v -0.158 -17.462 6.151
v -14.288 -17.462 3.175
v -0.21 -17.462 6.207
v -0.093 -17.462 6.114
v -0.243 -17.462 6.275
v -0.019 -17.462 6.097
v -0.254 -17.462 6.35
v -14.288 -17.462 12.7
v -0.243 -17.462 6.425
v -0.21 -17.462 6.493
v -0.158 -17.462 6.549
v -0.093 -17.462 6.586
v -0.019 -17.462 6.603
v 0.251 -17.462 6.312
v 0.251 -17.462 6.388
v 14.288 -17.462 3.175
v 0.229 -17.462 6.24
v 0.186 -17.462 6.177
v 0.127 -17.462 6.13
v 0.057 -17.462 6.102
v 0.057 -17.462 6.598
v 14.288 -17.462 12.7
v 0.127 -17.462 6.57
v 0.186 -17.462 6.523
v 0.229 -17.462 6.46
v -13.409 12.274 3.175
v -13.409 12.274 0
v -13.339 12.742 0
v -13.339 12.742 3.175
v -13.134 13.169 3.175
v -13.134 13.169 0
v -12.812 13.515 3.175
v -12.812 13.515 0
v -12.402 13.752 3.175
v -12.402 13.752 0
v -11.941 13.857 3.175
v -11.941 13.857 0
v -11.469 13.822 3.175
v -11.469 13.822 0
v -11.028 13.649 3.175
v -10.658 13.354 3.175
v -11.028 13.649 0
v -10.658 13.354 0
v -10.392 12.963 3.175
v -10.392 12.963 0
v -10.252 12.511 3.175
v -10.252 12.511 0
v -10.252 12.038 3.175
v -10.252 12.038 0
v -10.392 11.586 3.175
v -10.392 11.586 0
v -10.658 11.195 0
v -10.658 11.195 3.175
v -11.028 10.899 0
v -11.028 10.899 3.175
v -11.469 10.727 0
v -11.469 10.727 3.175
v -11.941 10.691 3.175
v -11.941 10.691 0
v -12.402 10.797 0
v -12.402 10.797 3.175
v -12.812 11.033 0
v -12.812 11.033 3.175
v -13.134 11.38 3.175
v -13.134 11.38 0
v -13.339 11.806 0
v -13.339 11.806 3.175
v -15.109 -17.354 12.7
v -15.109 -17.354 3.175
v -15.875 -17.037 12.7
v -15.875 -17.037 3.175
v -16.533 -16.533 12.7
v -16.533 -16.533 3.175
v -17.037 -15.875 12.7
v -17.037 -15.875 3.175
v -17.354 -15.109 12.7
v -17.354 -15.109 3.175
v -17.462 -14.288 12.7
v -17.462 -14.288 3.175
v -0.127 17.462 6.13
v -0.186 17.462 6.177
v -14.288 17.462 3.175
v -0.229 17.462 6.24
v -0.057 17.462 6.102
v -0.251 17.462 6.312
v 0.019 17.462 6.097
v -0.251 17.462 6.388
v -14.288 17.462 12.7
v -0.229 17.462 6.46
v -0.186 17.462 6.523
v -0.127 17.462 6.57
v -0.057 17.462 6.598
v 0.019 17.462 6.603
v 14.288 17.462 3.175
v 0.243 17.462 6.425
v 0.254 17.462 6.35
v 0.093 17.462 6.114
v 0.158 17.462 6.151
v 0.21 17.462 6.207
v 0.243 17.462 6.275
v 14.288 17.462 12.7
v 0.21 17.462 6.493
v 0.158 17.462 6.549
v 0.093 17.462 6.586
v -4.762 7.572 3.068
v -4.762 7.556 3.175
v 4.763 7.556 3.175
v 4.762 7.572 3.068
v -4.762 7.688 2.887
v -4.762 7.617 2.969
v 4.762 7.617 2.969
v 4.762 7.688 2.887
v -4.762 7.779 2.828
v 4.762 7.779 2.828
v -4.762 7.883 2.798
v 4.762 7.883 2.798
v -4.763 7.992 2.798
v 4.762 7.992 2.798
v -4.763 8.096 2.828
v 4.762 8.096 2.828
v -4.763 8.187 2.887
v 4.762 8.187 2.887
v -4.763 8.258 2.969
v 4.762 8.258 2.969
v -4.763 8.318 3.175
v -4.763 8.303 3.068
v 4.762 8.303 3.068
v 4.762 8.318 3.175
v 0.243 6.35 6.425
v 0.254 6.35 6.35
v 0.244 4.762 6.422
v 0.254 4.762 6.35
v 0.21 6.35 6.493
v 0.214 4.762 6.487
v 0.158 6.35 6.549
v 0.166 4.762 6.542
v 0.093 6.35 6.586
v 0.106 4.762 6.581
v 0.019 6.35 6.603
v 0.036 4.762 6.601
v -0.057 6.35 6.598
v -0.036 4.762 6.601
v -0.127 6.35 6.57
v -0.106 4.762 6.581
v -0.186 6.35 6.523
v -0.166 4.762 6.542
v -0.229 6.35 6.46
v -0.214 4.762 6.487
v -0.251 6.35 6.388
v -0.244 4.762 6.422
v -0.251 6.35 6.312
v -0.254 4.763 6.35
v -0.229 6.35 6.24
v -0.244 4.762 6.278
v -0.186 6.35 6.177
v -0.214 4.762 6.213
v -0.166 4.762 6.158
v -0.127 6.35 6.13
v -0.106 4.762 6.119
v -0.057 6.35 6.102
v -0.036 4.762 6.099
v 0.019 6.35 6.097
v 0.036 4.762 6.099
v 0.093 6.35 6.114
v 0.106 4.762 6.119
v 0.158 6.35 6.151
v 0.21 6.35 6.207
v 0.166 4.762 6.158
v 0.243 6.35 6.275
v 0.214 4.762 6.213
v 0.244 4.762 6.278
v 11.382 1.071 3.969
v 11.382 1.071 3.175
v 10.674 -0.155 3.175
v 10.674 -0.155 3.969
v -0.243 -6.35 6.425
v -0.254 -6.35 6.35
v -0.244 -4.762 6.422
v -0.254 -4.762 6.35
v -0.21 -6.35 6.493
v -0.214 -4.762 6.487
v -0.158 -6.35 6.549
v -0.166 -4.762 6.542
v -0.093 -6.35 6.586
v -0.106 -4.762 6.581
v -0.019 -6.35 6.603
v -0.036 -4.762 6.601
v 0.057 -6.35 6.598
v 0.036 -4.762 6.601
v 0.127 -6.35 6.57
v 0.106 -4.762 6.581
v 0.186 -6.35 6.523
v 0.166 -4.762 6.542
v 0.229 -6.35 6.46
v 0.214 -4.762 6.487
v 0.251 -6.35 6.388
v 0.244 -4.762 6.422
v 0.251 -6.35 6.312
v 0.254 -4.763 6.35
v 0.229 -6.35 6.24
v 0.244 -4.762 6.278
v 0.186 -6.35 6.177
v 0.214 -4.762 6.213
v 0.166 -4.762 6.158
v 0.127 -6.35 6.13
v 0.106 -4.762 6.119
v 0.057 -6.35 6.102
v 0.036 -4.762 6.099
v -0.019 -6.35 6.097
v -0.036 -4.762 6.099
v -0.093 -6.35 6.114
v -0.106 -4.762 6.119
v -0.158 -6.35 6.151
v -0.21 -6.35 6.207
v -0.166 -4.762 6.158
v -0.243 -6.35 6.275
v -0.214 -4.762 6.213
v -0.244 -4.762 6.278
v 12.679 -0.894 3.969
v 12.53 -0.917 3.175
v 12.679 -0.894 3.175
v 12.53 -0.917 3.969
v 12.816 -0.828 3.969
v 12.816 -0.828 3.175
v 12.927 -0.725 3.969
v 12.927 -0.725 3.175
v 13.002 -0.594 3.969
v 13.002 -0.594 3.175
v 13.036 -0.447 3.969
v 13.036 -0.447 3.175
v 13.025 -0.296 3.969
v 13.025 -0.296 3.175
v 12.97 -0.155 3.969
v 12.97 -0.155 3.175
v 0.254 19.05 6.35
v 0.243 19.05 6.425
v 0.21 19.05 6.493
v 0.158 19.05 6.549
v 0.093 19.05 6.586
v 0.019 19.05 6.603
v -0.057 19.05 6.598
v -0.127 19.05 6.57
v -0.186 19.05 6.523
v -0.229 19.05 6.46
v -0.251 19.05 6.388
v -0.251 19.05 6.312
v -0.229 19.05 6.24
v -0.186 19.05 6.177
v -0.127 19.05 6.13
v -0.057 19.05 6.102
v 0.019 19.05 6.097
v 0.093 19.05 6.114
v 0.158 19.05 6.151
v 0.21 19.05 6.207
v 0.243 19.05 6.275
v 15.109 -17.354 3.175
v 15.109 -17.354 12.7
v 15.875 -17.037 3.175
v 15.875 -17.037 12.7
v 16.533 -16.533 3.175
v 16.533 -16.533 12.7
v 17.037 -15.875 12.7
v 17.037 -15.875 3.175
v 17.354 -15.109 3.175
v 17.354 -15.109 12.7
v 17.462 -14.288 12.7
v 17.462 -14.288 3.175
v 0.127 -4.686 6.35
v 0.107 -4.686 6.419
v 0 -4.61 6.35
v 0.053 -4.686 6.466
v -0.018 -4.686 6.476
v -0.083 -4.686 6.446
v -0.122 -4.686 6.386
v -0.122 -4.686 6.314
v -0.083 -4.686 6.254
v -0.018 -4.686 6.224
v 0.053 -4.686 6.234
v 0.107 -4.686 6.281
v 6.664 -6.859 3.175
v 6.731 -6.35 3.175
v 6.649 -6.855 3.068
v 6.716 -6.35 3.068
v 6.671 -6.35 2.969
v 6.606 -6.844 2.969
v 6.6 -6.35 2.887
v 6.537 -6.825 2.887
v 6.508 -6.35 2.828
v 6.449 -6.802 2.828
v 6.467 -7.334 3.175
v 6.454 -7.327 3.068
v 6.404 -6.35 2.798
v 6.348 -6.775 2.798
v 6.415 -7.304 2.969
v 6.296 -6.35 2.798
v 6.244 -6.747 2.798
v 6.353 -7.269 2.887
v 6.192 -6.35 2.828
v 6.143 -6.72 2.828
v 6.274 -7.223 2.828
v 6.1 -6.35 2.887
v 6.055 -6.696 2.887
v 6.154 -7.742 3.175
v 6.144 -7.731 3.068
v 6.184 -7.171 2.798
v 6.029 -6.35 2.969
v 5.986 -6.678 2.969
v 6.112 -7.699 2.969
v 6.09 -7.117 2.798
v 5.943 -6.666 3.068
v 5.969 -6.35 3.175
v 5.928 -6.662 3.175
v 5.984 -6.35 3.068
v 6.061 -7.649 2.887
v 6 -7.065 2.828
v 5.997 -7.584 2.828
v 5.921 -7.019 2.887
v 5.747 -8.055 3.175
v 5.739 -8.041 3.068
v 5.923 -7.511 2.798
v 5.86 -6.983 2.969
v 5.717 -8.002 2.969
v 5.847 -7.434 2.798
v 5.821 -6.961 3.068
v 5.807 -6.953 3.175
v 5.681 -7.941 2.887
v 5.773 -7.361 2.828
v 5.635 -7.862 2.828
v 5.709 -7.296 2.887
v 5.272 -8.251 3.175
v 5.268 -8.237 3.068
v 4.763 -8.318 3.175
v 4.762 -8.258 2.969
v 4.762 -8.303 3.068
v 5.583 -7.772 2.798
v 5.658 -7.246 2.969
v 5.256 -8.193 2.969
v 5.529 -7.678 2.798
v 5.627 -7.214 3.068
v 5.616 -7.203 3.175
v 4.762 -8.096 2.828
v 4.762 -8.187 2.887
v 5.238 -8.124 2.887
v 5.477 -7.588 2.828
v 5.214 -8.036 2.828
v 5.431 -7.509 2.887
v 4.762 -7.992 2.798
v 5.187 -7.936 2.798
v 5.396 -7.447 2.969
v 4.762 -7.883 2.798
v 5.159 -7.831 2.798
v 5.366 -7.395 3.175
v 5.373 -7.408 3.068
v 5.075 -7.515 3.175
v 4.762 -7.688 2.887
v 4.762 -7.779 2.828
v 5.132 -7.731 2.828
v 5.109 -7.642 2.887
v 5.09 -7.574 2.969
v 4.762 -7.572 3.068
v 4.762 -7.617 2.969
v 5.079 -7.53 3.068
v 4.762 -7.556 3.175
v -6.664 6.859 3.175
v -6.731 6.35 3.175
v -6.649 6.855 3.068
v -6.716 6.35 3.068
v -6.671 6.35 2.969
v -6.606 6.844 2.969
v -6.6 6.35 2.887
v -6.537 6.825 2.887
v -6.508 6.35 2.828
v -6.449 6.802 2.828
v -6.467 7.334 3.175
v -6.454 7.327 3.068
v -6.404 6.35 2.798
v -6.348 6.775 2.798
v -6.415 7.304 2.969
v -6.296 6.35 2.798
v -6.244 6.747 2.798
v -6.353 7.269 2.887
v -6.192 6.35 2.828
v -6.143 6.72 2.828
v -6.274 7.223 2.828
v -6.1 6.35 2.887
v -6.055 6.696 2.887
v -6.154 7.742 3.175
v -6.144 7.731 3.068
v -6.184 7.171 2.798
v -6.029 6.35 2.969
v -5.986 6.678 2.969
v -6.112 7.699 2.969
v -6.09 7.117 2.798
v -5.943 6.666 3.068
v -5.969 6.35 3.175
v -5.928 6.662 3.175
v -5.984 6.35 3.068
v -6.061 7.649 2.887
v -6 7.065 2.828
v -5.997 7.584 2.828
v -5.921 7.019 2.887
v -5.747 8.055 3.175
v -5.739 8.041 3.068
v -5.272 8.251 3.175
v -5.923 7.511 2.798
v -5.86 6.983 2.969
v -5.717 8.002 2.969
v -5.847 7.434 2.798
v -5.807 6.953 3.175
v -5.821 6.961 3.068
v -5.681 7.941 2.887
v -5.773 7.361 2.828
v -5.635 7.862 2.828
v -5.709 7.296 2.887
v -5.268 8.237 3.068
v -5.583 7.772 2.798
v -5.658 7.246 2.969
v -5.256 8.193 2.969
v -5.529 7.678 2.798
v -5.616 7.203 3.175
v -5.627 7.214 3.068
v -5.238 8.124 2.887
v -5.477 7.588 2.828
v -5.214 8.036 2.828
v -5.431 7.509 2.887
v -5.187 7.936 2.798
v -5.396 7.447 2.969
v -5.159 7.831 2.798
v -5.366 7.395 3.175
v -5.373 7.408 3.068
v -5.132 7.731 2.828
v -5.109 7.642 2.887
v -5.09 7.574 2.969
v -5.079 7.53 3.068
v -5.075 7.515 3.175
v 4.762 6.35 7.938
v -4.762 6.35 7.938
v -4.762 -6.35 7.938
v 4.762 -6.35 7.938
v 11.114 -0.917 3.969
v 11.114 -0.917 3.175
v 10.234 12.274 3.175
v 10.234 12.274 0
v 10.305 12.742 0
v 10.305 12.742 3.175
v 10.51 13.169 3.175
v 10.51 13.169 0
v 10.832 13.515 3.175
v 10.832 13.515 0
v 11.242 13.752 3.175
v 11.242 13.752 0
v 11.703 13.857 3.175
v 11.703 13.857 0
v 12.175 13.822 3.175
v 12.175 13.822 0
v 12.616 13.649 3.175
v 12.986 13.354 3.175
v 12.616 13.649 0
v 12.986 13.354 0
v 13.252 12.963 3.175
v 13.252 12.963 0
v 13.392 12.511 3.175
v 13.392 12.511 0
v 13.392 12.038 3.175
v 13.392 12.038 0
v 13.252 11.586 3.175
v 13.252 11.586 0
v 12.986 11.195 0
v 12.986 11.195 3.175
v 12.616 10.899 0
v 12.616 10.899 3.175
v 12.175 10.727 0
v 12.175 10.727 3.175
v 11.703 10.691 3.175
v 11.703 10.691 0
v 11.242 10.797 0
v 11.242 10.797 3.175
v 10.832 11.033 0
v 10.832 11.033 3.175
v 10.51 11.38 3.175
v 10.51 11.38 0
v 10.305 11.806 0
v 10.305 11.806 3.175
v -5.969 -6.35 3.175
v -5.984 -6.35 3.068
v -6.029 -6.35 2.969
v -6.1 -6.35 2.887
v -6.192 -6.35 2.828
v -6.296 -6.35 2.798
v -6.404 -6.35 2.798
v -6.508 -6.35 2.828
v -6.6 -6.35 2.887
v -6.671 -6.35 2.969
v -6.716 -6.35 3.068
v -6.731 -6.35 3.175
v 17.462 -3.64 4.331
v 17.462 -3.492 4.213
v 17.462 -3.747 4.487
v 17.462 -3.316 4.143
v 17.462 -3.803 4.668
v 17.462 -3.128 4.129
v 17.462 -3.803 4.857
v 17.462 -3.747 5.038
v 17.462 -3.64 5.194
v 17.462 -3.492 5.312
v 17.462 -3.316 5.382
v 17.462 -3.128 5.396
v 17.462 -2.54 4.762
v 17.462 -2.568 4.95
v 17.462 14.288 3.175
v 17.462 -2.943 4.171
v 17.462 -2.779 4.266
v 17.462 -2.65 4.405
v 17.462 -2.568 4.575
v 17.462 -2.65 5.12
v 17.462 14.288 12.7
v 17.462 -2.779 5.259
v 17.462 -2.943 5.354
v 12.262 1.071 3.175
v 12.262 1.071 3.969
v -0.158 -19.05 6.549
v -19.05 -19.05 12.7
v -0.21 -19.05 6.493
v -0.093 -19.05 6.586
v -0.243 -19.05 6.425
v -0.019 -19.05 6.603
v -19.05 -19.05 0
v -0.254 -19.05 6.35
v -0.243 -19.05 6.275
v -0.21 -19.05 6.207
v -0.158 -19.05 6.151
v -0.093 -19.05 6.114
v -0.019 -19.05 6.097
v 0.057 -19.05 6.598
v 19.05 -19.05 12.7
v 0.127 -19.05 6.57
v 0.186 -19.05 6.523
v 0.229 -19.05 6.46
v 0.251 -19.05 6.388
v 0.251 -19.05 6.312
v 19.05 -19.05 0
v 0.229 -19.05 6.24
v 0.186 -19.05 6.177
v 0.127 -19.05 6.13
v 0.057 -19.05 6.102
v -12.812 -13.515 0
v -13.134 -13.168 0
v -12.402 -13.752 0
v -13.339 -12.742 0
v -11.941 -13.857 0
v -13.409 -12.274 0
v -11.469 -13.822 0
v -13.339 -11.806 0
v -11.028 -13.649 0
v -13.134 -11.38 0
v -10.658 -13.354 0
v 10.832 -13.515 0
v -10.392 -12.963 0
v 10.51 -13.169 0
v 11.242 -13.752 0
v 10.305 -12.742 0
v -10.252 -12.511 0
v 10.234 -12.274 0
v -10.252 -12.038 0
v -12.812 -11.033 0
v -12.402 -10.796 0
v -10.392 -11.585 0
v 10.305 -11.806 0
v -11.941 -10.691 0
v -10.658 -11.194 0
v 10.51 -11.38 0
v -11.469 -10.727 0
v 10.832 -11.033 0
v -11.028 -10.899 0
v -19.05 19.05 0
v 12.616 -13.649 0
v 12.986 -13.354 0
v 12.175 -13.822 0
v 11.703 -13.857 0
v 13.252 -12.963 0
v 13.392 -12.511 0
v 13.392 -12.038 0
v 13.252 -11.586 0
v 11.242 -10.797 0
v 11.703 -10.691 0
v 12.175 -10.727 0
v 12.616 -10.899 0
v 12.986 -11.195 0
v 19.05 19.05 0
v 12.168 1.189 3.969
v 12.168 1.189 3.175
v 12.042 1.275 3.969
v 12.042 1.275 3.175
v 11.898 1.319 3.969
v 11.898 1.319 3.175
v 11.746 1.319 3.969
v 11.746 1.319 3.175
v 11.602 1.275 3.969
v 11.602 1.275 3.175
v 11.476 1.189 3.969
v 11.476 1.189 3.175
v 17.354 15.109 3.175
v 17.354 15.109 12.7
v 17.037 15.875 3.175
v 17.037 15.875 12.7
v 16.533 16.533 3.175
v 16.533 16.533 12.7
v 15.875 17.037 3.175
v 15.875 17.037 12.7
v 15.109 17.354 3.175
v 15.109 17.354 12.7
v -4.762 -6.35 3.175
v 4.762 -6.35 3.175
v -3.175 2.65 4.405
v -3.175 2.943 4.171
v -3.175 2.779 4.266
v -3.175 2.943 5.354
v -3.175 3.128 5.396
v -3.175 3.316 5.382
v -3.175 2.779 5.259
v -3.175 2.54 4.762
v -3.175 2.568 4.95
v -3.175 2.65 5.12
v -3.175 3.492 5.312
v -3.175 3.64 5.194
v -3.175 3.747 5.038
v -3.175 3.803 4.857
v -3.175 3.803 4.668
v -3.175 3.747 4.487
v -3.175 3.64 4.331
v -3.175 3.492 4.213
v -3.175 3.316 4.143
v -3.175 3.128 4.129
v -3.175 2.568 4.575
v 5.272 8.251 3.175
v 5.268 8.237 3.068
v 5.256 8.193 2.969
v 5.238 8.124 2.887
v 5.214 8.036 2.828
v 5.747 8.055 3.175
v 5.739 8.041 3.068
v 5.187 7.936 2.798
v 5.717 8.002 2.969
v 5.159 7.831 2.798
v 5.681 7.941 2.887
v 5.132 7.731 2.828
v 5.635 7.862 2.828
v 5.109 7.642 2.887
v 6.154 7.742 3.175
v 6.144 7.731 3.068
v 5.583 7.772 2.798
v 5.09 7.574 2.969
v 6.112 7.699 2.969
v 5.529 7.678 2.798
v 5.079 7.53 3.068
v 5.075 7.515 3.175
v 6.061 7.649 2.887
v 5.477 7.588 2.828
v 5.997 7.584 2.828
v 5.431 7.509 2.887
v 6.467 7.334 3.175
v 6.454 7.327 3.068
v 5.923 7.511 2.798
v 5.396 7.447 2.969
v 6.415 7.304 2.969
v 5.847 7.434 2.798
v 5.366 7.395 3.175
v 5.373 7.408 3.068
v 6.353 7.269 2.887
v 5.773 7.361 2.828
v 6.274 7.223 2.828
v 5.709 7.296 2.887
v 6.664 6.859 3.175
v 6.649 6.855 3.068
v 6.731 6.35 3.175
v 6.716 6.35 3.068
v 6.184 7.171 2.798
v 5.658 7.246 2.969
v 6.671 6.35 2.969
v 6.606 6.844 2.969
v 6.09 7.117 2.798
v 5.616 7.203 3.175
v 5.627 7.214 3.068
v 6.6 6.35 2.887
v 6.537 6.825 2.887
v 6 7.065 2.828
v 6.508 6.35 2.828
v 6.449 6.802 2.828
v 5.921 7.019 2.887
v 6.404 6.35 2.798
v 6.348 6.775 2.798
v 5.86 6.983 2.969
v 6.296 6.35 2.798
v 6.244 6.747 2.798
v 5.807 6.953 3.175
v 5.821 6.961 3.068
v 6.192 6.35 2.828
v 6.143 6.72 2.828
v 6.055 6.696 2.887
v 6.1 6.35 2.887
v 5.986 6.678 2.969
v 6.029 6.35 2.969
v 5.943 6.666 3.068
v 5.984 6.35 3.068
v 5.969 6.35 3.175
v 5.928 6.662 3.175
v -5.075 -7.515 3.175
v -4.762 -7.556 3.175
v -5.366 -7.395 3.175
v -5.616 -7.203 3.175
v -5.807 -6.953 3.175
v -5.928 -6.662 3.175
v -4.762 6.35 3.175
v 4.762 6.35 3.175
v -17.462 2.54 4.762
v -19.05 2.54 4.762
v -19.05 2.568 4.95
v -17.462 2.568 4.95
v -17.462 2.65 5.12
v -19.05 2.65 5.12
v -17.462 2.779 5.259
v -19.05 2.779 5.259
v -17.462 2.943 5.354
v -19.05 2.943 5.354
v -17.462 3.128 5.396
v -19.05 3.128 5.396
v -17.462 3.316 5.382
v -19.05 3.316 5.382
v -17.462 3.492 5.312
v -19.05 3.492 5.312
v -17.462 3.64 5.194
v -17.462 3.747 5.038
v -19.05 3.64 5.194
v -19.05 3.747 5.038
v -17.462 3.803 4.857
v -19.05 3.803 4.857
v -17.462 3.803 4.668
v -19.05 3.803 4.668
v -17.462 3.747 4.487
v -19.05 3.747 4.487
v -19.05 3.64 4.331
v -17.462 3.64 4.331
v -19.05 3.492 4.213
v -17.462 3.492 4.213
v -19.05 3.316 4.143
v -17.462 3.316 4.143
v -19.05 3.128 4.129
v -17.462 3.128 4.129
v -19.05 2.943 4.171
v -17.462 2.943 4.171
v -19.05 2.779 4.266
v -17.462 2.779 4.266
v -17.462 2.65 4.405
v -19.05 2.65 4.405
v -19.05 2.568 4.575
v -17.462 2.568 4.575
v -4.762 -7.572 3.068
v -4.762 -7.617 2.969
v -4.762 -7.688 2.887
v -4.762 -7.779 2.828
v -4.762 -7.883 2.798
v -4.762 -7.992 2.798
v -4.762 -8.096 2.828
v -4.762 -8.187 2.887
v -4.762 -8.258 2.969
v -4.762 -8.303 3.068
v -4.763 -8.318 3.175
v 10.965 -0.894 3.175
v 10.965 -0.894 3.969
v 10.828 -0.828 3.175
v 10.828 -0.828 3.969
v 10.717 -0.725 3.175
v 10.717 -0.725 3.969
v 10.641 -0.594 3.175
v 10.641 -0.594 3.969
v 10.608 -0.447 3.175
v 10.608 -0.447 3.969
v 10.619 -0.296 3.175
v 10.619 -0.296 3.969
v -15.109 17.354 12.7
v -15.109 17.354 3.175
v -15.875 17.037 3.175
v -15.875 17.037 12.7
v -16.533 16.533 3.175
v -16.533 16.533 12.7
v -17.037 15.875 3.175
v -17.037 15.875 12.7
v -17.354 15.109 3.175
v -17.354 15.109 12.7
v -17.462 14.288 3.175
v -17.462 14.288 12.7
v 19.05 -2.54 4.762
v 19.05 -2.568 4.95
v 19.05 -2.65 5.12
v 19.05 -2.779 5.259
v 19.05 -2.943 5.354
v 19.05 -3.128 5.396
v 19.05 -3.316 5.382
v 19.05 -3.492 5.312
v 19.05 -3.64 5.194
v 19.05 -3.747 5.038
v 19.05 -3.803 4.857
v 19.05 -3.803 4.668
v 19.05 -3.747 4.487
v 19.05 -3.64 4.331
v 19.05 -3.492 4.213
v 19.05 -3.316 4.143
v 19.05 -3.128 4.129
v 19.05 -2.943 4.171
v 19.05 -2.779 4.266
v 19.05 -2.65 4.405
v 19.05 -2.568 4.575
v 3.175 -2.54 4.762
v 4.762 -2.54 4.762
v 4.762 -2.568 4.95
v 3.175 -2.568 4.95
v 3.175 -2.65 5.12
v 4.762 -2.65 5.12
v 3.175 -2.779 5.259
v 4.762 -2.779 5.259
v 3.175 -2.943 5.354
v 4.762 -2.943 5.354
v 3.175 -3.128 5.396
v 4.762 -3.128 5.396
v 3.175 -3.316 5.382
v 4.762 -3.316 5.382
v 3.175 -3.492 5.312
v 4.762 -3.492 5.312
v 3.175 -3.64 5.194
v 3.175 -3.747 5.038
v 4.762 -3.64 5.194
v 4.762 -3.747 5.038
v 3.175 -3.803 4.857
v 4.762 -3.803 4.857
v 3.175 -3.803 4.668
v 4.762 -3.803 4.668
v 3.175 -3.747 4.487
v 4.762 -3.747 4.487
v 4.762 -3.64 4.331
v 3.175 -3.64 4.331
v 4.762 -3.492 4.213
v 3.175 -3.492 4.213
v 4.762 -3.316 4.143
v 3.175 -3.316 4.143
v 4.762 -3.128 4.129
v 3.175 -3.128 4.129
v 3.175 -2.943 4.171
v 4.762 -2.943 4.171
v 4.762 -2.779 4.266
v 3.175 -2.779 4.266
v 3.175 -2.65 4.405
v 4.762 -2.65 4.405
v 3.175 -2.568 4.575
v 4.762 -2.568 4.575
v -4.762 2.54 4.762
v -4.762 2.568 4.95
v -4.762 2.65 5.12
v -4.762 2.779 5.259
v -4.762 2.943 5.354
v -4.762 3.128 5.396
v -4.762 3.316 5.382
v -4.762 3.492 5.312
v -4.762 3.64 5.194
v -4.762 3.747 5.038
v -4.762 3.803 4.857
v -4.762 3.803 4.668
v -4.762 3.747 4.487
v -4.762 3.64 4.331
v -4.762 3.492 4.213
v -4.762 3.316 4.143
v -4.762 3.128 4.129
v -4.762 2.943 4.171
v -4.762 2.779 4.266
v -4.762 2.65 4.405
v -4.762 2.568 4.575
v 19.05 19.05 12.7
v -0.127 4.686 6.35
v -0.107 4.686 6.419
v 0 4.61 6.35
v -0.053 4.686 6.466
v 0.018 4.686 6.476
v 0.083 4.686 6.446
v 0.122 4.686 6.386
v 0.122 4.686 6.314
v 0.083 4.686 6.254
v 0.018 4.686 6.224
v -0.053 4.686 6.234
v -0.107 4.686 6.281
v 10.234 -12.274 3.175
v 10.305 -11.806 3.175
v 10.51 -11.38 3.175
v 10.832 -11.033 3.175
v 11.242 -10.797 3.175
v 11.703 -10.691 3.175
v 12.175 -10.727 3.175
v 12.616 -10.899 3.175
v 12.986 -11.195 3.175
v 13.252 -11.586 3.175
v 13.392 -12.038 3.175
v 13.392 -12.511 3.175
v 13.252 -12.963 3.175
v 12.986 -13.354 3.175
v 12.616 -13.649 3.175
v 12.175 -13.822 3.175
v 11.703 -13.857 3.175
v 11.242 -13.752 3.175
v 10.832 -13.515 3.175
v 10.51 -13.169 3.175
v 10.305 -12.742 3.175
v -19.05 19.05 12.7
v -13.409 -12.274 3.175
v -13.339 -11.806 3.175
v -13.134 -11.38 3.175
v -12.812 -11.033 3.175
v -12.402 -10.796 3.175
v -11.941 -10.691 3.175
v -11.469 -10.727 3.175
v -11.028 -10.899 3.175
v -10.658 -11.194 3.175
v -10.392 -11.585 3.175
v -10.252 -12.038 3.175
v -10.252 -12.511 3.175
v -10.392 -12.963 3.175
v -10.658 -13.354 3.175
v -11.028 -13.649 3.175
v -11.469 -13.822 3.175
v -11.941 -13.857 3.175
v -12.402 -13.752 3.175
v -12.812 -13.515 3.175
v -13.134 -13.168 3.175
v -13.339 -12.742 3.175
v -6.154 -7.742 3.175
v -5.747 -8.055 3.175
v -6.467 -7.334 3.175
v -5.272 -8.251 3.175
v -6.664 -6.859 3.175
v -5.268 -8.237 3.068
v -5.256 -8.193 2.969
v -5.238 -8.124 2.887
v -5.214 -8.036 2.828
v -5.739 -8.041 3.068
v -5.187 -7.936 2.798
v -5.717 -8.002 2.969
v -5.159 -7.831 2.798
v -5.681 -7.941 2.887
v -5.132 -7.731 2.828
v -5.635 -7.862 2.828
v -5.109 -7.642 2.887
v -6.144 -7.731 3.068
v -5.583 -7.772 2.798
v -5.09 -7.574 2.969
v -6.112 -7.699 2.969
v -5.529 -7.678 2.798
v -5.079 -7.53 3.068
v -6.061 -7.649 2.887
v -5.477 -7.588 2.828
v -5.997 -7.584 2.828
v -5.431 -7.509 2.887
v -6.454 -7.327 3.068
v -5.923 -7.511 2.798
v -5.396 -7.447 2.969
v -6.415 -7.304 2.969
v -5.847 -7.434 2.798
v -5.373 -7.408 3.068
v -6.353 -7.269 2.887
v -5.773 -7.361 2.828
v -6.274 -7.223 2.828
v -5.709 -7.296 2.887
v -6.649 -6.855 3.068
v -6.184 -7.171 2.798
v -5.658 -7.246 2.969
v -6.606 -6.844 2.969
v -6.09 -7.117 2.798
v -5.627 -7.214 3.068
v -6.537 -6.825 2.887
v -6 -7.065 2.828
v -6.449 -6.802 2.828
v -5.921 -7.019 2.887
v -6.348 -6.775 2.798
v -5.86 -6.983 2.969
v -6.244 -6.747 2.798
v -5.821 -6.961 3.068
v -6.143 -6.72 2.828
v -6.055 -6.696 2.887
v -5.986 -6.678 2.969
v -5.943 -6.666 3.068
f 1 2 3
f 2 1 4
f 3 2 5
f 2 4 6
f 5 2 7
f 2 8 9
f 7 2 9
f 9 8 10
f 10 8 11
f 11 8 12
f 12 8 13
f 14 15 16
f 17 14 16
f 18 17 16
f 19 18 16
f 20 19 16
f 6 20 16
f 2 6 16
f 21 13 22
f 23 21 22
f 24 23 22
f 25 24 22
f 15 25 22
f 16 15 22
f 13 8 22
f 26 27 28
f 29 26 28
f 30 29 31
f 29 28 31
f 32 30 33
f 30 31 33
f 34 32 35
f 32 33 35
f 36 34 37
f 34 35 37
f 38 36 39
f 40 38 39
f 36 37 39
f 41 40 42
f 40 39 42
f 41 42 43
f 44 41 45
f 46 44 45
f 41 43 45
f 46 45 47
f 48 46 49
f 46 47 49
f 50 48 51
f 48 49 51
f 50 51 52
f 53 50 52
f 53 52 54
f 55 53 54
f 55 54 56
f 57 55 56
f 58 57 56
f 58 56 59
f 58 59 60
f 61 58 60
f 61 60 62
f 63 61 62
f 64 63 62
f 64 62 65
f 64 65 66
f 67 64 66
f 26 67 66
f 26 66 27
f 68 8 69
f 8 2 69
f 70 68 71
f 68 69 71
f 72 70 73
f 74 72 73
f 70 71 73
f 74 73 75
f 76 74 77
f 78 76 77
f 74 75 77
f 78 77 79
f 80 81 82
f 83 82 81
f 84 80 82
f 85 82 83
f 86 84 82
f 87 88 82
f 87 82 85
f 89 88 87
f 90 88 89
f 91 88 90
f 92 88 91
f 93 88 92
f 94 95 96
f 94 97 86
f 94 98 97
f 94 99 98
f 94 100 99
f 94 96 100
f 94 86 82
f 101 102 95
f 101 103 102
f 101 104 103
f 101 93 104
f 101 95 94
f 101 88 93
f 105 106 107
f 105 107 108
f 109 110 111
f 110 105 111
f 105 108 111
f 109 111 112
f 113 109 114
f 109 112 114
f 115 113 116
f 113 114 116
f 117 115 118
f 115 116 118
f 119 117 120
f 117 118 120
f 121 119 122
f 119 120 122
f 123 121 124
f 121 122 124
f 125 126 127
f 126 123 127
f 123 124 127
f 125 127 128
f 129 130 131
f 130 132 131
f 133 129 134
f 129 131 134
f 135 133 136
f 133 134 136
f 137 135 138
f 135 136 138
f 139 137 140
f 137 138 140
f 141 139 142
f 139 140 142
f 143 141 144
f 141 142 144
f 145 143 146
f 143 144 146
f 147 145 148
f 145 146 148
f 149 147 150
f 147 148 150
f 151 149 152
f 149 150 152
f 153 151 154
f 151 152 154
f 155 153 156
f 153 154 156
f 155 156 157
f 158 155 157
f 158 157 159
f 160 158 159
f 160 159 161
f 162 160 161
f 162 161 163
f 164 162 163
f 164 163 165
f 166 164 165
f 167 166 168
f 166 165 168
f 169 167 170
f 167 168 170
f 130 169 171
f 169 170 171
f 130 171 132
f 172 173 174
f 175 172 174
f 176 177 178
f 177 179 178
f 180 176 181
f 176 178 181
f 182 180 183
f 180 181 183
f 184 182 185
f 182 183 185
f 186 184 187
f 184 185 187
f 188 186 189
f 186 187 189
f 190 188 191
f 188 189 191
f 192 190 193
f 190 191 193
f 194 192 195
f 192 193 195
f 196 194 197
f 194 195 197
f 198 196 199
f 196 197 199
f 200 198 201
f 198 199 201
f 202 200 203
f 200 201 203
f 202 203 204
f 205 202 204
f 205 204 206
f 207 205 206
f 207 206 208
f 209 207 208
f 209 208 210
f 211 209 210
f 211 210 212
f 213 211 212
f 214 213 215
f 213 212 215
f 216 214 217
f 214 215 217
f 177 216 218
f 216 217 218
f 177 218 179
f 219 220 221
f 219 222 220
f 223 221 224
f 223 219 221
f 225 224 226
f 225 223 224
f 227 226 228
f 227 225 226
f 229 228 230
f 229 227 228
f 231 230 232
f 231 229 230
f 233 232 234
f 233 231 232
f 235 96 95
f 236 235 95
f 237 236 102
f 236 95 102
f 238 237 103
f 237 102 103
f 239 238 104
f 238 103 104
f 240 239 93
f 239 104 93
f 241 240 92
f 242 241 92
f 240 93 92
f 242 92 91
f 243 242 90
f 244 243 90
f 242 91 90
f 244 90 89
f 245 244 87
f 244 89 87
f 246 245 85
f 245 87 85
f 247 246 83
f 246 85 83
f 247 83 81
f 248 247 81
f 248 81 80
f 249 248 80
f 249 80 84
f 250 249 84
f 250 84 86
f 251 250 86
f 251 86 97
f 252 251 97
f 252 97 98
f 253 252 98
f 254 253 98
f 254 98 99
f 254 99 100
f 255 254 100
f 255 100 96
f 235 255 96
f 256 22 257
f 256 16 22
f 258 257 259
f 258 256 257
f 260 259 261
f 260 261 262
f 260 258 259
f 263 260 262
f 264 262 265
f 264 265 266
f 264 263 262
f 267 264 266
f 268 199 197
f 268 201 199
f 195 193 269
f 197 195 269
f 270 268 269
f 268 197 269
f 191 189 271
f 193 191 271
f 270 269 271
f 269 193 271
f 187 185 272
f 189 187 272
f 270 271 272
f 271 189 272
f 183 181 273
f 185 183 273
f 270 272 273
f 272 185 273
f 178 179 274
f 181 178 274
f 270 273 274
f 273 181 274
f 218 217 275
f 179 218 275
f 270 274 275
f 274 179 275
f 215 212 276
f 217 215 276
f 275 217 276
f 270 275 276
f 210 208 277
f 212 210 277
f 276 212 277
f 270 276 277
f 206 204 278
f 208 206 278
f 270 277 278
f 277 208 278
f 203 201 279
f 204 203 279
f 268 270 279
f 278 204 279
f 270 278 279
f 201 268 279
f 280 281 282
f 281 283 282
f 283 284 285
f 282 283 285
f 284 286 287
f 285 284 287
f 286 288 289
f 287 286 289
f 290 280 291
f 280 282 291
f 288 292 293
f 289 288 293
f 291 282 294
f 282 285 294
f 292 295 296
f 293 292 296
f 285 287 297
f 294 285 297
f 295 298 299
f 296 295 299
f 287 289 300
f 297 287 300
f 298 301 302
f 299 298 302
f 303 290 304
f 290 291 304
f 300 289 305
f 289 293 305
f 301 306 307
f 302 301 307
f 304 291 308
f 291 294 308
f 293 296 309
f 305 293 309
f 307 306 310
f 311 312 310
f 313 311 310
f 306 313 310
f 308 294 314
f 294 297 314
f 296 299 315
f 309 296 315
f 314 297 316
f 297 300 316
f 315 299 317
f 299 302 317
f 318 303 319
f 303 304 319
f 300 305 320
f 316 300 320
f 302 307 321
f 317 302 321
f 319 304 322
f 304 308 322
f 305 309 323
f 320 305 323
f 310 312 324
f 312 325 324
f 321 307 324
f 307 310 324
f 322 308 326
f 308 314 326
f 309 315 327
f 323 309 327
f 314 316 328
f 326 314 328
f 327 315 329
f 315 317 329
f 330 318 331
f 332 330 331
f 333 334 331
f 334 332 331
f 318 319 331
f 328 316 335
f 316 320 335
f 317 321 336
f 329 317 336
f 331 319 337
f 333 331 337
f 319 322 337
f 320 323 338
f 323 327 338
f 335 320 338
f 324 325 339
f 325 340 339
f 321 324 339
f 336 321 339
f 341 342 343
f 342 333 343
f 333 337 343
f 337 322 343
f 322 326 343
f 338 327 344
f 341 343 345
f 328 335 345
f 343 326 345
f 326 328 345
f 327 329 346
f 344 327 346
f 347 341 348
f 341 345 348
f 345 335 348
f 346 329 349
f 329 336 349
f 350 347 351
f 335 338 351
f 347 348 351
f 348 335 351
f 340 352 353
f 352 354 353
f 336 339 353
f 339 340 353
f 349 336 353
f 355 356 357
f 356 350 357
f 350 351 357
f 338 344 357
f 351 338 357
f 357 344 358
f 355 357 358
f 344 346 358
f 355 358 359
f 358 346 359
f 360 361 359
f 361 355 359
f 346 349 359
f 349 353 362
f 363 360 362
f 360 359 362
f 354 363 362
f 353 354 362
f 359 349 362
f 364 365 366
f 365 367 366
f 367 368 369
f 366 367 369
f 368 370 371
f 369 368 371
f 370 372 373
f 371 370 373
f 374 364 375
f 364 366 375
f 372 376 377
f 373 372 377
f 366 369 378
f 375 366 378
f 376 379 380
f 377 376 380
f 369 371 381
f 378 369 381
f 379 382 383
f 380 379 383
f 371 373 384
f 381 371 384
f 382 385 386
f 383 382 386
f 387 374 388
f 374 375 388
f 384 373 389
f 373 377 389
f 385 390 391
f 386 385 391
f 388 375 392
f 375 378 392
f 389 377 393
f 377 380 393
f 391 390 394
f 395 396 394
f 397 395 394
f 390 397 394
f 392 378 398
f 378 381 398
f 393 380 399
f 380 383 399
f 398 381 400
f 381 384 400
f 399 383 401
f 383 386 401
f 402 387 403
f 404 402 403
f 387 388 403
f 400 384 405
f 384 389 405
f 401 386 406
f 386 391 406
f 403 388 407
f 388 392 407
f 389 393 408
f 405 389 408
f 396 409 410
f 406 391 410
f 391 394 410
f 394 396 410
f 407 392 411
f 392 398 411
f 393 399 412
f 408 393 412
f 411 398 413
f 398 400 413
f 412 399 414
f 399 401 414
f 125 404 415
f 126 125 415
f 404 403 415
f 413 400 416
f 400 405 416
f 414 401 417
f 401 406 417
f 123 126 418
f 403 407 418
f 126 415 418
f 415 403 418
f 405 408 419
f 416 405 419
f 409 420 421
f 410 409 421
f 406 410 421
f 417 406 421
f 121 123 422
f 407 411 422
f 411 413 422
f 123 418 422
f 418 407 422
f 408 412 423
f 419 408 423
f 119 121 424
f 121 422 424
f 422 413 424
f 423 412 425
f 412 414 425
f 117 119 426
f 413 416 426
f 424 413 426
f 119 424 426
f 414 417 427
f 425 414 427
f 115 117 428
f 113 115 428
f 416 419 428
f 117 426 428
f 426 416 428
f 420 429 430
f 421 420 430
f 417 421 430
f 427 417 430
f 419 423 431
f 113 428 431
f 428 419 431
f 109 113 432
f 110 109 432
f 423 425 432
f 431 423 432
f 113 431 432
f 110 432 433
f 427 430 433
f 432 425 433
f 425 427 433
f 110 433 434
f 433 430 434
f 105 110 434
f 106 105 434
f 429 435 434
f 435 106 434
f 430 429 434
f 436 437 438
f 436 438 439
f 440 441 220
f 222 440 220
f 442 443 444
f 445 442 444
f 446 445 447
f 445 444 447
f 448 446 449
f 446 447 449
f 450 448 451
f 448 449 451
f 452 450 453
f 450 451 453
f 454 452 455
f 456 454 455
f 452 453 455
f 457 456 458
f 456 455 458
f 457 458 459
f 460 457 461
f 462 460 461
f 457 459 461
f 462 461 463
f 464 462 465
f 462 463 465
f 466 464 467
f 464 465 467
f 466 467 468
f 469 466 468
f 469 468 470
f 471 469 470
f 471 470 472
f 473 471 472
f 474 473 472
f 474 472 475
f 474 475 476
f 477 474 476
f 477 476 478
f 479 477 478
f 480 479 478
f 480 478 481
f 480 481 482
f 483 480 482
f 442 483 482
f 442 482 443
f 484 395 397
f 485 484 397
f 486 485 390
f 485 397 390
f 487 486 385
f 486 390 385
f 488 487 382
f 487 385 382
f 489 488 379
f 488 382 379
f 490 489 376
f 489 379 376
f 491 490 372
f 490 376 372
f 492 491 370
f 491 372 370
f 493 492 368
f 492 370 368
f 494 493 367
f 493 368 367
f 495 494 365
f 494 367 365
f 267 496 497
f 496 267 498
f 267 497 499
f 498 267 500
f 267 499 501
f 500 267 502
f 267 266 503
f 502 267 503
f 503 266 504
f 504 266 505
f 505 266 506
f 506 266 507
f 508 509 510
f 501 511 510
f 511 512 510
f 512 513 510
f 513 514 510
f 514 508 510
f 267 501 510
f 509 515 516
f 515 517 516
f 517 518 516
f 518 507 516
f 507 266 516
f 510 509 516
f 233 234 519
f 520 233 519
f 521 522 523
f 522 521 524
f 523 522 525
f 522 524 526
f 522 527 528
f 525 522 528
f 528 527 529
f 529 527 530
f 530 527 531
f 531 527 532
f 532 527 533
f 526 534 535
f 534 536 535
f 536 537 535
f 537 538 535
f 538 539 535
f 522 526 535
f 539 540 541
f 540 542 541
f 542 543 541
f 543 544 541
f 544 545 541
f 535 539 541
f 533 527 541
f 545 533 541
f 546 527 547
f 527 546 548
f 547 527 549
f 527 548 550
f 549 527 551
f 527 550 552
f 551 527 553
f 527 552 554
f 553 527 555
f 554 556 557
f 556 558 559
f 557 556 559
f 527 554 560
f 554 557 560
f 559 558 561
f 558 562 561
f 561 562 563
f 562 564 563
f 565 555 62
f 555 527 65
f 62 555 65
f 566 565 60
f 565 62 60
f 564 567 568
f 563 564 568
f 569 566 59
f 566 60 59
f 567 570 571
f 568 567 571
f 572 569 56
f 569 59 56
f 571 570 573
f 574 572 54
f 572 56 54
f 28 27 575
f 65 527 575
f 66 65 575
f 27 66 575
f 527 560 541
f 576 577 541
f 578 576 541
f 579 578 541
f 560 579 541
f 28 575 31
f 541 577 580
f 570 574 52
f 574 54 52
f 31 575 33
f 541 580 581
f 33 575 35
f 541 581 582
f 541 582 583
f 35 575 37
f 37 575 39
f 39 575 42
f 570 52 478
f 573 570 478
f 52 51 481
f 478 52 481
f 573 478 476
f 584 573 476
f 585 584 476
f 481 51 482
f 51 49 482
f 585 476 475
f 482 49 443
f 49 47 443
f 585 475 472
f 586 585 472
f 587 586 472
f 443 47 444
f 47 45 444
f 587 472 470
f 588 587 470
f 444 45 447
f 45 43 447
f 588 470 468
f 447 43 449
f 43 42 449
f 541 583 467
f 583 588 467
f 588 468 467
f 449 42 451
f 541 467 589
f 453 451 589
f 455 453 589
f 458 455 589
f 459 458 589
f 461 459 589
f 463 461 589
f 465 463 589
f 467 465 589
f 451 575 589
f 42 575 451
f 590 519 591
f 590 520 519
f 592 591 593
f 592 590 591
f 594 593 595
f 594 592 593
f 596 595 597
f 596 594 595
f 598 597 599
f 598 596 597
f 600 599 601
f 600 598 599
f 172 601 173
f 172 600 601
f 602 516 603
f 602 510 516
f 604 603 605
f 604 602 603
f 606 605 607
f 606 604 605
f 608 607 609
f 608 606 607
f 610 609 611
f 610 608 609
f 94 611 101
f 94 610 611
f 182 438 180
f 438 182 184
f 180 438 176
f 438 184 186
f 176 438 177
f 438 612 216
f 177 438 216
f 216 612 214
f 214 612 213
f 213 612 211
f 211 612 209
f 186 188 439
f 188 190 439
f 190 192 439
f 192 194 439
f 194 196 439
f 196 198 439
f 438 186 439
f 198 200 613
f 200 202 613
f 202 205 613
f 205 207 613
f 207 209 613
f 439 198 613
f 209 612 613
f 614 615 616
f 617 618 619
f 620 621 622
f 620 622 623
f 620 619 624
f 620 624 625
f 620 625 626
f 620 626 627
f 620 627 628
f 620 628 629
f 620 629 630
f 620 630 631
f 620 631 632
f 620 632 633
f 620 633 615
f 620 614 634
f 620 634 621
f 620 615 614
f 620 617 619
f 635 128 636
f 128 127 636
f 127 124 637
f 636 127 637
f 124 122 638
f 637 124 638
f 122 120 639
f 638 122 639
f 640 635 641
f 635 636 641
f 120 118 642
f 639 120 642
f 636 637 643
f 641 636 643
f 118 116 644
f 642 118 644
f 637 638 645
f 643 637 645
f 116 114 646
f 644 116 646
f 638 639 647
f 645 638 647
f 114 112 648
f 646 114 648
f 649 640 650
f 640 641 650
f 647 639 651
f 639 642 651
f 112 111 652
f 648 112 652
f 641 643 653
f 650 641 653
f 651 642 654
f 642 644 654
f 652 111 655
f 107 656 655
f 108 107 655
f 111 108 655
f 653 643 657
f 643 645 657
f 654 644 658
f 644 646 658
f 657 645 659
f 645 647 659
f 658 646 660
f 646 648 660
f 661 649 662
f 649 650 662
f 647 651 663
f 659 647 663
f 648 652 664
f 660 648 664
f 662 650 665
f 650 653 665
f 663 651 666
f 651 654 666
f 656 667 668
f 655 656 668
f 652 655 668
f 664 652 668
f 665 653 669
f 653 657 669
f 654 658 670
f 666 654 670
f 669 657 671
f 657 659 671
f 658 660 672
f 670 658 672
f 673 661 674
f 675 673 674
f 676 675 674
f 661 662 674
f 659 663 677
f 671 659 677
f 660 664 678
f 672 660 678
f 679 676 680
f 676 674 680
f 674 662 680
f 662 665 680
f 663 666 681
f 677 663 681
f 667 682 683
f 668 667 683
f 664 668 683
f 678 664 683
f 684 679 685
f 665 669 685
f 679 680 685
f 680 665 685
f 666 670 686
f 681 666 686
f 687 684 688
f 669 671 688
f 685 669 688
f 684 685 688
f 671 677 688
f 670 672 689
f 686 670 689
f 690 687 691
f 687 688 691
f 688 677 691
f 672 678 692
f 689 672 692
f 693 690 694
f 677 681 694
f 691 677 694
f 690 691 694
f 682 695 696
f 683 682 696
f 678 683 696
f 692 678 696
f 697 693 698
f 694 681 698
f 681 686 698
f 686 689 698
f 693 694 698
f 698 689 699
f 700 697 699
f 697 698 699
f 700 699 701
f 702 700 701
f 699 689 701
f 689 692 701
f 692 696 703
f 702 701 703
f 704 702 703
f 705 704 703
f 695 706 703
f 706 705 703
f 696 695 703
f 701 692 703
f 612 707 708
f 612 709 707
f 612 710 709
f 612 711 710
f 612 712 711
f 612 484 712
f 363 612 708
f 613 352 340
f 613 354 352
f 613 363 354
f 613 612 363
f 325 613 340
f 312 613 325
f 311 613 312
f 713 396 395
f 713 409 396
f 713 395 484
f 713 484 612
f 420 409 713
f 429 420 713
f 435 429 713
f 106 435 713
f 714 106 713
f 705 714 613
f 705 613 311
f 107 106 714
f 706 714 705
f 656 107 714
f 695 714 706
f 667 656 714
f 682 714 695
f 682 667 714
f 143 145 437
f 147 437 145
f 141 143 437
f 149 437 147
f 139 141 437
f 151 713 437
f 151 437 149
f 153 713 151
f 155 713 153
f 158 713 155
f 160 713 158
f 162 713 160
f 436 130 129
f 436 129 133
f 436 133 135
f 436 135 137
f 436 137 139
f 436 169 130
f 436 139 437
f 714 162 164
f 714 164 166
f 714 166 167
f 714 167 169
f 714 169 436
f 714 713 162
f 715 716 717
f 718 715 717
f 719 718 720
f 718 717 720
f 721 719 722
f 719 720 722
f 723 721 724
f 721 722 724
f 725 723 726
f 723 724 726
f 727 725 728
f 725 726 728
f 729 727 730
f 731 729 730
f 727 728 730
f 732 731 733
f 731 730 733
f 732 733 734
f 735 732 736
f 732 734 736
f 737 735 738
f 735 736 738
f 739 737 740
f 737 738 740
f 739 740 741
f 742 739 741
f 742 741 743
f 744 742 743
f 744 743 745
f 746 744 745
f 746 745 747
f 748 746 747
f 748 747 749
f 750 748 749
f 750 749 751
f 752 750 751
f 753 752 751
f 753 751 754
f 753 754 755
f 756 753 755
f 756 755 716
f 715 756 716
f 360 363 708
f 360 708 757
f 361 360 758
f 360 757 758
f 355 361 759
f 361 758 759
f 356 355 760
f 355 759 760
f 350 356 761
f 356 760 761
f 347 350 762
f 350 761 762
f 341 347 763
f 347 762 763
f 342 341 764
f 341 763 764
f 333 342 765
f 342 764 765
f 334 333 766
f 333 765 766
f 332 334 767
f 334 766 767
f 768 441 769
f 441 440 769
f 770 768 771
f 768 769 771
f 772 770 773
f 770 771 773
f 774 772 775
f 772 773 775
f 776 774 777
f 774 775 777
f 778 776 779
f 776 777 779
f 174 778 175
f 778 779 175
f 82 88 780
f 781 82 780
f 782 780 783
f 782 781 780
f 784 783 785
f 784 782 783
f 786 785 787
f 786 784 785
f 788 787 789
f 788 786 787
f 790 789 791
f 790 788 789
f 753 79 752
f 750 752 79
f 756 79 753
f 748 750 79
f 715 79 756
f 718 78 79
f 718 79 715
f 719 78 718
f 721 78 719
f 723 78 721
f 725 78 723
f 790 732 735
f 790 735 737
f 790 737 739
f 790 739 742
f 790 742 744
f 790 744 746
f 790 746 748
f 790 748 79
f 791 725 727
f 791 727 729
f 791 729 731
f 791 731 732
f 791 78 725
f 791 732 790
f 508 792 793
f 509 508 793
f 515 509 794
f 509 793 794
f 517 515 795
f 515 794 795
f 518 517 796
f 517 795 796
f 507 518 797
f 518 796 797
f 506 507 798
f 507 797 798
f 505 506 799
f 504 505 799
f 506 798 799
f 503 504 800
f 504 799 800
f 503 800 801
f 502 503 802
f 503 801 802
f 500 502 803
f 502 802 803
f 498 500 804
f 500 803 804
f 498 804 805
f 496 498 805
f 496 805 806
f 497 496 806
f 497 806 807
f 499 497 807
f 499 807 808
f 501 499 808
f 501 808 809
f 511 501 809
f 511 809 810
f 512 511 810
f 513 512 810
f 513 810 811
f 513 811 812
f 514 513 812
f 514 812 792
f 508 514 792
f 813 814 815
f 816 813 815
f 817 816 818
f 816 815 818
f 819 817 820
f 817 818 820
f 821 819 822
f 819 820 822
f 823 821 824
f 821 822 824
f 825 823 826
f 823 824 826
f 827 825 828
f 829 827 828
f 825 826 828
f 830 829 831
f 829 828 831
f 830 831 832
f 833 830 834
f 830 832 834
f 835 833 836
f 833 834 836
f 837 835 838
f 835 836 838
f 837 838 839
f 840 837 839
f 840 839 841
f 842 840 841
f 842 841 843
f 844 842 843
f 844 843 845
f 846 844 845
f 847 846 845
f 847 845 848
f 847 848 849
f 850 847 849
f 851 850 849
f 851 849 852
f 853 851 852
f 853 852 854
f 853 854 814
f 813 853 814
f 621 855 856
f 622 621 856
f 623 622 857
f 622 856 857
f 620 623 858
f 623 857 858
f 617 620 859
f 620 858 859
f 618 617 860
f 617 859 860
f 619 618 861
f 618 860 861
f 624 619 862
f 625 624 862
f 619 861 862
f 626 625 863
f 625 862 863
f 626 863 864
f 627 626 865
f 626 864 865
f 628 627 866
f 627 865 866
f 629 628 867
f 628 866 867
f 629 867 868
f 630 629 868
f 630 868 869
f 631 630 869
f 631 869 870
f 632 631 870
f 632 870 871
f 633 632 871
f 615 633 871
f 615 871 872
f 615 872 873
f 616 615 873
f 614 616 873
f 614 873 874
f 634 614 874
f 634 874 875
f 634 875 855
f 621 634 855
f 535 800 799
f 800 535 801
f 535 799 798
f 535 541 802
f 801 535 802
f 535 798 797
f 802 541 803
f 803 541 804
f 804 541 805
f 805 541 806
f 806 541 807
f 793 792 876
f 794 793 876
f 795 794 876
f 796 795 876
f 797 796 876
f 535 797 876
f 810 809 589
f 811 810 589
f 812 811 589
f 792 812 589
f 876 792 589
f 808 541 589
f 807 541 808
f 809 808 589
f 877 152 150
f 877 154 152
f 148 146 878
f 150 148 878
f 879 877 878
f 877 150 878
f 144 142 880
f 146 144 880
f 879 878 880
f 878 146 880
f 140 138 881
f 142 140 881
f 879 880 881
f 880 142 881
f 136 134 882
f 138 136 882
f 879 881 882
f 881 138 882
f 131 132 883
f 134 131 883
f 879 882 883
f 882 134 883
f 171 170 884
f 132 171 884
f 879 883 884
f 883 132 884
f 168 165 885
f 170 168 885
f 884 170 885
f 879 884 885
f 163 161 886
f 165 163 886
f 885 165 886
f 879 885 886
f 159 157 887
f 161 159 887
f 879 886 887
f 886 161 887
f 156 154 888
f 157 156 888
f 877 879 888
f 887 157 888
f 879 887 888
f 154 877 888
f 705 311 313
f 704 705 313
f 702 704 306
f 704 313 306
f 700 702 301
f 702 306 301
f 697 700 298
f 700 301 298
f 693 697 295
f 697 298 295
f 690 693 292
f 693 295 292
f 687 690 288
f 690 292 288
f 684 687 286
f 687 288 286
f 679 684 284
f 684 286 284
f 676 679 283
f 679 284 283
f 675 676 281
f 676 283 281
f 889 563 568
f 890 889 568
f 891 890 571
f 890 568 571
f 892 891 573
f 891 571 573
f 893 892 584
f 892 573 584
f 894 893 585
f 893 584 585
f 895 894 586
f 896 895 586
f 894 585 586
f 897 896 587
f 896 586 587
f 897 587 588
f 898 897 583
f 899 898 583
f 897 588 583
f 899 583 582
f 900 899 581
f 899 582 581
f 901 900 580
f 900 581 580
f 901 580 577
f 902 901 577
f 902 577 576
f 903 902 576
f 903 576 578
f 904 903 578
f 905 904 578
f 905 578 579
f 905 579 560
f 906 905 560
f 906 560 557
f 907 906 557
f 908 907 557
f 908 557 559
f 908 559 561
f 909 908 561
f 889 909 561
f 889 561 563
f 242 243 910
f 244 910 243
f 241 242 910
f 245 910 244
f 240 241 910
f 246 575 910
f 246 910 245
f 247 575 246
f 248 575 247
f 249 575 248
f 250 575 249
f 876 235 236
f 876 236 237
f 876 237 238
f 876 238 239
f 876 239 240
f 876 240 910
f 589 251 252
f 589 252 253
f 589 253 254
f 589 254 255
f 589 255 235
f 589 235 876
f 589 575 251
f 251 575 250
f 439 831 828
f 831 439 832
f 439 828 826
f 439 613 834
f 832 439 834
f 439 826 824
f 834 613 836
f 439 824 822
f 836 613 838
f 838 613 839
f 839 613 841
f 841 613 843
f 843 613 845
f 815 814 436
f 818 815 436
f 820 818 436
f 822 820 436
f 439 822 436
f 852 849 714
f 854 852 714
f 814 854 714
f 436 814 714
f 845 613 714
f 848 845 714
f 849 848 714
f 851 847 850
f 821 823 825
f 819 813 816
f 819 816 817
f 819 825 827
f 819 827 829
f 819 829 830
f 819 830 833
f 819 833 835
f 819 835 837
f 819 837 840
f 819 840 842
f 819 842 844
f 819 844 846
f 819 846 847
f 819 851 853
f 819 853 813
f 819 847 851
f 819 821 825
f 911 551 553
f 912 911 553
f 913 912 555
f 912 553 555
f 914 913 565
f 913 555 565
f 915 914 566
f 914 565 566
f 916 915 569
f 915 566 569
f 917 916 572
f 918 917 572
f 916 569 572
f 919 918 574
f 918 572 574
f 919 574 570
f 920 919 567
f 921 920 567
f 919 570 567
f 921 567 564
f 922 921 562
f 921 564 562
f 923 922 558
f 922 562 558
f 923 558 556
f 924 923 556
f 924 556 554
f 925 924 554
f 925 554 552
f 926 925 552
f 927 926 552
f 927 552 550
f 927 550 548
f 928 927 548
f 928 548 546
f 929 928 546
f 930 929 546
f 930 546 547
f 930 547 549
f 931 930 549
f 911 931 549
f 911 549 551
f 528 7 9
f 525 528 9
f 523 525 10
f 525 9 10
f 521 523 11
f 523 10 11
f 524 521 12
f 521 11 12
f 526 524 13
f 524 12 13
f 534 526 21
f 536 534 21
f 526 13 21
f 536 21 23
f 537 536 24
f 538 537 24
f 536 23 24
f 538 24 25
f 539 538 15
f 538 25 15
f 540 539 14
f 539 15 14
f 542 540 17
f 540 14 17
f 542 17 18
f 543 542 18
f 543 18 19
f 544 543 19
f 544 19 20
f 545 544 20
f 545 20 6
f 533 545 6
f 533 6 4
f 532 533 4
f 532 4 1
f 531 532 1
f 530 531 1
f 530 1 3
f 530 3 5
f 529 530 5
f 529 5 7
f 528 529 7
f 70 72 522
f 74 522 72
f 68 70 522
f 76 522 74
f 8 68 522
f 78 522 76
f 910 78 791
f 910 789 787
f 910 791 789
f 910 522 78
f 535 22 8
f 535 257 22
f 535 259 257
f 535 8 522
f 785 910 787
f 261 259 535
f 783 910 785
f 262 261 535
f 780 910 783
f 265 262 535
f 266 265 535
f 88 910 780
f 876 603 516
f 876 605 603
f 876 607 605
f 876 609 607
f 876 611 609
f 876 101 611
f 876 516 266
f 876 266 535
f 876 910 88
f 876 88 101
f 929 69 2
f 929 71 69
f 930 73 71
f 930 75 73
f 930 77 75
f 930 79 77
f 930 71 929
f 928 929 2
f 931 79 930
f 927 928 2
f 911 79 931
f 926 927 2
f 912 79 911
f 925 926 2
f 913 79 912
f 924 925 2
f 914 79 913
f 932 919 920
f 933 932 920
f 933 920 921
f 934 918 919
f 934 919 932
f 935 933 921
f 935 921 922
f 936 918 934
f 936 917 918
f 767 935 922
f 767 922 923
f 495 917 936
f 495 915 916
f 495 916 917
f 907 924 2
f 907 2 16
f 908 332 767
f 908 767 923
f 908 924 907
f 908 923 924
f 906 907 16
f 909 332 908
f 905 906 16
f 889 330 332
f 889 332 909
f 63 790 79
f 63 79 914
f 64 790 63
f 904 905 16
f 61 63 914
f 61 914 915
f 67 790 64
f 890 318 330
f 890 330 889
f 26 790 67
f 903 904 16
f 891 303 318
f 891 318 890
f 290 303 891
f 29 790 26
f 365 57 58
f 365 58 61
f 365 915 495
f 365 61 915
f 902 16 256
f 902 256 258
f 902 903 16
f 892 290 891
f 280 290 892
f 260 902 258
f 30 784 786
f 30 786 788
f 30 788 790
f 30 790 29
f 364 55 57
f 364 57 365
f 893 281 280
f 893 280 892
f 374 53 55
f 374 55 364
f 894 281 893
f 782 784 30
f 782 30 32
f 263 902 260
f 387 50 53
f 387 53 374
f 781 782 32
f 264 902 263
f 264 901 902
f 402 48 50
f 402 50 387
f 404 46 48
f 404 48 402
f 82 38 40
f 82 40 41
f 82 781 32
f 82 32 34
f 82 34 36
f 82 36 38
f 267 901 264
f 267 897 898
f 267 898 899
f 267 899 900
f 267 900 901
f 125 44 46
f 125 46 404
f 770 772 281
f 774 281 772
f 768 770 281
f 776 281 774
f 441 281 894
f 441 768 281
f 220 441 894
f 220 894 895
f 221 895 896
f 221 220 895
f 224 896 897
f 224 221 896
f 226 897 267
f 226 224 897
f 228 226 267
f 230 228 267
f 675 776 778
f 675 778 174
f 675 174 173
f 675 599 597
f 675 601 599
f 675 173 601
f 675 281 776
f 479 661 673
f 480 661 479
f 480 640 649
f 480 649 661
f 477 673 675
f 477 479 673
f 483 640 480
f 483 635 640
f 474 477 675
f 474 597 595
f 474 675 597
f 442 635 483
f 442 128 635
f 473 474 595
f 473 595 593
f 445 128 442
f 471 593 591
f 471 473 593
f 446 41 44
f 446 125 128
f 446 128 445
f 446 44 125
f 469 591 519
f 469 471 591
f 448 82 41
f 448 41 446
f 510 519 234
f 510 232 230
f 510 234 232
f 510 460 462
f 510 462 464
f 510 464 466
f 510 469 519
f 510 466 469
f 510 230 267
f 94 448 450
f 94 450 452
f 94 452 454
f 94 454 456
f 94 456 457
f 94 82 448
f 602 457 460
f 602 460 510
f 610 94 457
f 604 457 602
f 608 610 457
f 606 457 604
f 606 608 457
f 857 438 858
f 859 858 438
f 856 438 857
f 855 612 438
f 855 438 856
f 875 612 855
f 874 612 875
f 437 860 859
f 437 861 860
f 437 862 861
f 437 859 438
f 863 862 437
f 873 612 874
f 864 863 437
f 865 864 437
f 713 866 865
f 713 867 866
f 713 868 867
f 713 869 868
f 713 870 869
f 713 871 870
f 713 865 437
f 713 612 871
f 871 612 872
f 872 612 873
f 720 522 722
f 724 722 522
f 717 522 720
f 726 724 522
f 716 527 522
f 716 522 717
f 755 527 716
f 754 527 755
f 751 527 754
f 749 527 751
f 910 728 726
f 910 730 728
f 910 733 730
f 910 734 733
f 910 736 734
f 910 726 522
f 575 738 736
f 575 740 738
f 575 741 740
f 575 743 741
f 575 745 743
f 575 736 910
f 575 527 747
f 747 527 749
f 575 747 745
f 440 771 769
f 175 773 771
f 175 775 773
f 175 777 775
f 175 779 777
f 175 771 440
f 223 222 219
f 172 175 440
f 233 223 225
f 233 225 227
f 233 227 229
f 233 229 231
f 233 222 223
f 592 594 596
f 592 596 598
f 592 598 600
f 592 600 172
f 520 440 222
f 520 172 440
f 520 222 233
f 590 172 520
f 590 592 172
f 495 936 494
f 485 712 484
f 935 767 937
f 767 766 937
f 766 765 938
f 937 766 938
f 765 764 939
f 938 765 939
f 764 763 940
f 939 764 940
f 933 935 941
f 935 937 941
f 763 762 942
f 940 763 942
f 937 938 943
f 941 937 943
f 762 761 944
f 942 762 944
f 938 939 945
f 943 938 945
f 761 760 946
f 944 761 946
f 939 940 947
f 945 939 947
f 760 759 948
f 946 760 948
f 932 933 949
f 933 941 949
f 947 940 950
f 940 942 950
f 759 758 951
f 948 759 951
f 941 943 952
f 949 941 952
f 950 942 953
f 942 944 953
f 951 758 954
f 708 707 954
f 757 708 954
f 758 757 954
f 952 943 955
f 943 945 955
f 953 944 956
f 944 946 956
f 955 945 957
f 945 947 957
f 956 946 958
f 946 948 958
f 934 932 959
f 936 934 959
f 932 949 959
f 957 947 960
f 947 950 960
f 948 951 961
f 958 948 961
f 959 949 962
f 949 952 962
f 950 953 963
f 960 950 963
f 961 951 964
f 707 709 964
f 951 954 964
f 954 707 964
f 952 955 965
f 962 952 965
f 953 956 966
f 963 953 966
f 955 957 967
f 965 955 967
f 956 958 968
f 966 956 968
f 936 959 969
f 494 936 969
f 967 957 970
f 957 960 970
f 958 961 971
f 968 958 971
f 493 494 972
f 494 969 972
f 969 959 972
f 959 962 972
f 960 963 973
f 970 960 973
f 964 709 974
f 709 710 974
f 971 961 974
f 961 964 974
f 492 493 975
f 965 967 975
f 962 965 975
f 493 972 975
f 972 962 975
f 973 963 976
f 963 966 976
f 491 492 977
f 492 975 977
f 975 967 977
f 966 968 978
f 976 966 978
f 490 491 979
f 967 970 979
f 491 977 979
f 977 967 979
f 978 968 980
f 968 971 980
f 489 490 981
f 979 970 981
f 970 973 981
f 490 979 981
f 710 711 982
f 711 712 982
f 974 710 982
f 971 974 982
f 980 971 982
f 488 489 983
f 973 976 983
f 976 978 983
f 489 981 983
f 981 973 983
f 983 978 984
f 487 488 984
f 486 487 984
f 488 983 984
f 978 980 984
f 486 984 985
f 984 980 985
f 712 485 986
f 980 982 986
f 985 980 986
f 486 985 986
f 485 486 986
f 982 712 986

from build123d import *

# Parameters (mm, degrees)
F0_W      = 38.1
F0_H      = 38.1
F1_DEPTH  = 12.7
F2_W      = 34.925
F2_H      = 34.925
F3_DEPTH  = 9.525
F4_W      = 9.525
F4_H      = 12.7
F5_DEPTH  = 4.7625
F7_D      = 0.508
F7_DEPTH  = 14.2875
F7_TIP    = 0.1526185972
F9_D      = 0.508
F9_DEPTH  = 14.2875
F9_TIP    = 0.1526185972
F10_R     = 3.175
F15_D     = 3.175
F17_DEPTH = 0.79375
F18_R     = 0.508
F19_R     = 0.635
F20_DEPTH = 15.875
F21_R     = 0.635
F22_DEPTH = 15.875


with BuildPart() as f1:
    # F0 (on Top) → F1 (new body)
    with BuildSketch(Plane.XY):
        Rectangle(F0_W, F0_H)
    extrude(amount=F1_DEPTH)

    # F2 (on face) → F3 (cut)
    with BuildSketch(Plane.XY.offset(12.7)):
        Rectangle(F2_W, F2_H)
    extrude(amount=-F3_DEPTH, mode=Mode.SUBTRACT)

    # F4 (on face) → F5 (join)
    with BuildSketch(Plane.XY.offset(3.175)):
        Rectangle(F4_W, F4_H)
    extrude(amount=F5_DEPTH)

    # F7
    with Locations(Plane.XZ.offset(19.05)):
        with Locations((0, 6.35)):
            Hole(F7_D / 2, depth=F7_DEPTH)
            with Locations((0, 0, -(F7_DEPTH + F7_TIP / 2))):  # 118° drill point
                Cone(0, F7_D / 2, F7_TIP, mode=Mode.SUBTRACT)

    # F9
    with Locations(Plane(origin=(0, 19.05, 0), x_dir=(-1, 0, 0), z_dir=(0, 1, 0))):
        with Locations((0, 6.35)):
            Hole(F9_D / 2, depth=F9_DEPTH)
            with Locations((0, 0, -(F9_DEPTH + F9_TIP / 2))):  # 118° drill point
                Cone(0, F9_D / 2, F9_TIP, mode=Mode.SUBTRACT)

    # F10
    f10_edges = [f1.edges().sort_by_distance(p)[0] for p in [
        (-17.4625, 17.4625, 7.9375),
        (-17.4625, -17.4625, 7.9375),
        (17.4625, -17.4625, 7.9375),
        (17.4625, 17.4625, 7.9375),
    ]]
    fillet(f10_edges, radius=F10_R)

    # F13: sweep along a path in F11
    with BuildLine(Plane.XY.offset(3.175)) as f13_path:
        Line((4.7625, -7.9375), (-4.7625, -7.9375))
        ThreePointArc((-4.7625, -7.9375), (-5.8850320151, -7.4725320151), (-6.35, -6.35))
        Line((-6.35, -6.35), (-6.35, 0))
        Line((-6.35, 0), (-6.35, 6.35))
        ThreePointArc((-6.35, 6.35), (-5.8850320151, 7.4725320151), (-4.7625, 7.9375))
        Line((-4.7625, 7.9375), (4.7625, 7.9375))
        ThreePointArc((4.7625, 7.9375), (5.8850320151, 7.4725320151), (6.35, 6.35))
        Line((6.35, 6.35), (6.35, -6.35))
        ThreePointArc((6.35, -6.35), (5.8850320151, -7.4725320151), (4.7625, -7.9375))
    # F12 (on Front) → F13 (sweep, cut)
    with BuildSketch(Plane.XZ):
        with BuildLine():
            Line((-5.969, 3.175), (-6.731, 3.175))
            ThreePointArc((-6.731, 3.175), (-6.35, 2.794), (-5.969, 3.175))
        make_face()
    sweep(path=f13_path.line, mode=Mode.SUBTRACT)

    # F15 (through all)
    with Locations(Plane.XY.offset(3.175)):
        with Locations((11.8219737159, -12.2742969073), (11.8219737159, 12.2742969073), (-11.8219737159, 12.2742969073), (-11.8218979341, -12.2742284023)):
            Hole(F15_D / 2)

    # F16 (on face) → F17 (join)
    with BuildSketch(Plane.XY.offset(3.175)):
        Polygon((10.2344737159, -0.9165435523), (13.4094737159, -0.9165435523), (11.8219737159, 1.8330871047), align=None)
    extrude(amount=F17_DEPTH)

    # F18
    f18_edges = [f1.edges().sort_by_distance(p)[0] for p in [
        (11.821974, 1.833087, 3.571875),
        (13.409474, -0.916544, 3.571875),
        (10.234474, -0.916544, 3.571875),
    ]]
    fillet(f18_edges, radius=F18_R)

    # F19 (on face) → F20 (cut)
    with BuildSketch(Plane.YZ.offset(19.05)):
        with Locations((-3.175, 4.7625)):
            Circle(F19_R)
    extrude(amount=-F20_DEPTH, mode=Mode.SUBTRACT)

    # F21 (on face) → F22 (cut)
    with BuildSketch(Plane(origin=(-19.05, 0, 0), x_dir=(0, -1, 0), z_dir=(-1, 0, 0))):
        with Locations((-3.175, 4.7625)):
            Circle(F21_R)
    extrude(amount=-F22_DEPTH, mode=Mode.SUBTRACT)


solid = f1.part
